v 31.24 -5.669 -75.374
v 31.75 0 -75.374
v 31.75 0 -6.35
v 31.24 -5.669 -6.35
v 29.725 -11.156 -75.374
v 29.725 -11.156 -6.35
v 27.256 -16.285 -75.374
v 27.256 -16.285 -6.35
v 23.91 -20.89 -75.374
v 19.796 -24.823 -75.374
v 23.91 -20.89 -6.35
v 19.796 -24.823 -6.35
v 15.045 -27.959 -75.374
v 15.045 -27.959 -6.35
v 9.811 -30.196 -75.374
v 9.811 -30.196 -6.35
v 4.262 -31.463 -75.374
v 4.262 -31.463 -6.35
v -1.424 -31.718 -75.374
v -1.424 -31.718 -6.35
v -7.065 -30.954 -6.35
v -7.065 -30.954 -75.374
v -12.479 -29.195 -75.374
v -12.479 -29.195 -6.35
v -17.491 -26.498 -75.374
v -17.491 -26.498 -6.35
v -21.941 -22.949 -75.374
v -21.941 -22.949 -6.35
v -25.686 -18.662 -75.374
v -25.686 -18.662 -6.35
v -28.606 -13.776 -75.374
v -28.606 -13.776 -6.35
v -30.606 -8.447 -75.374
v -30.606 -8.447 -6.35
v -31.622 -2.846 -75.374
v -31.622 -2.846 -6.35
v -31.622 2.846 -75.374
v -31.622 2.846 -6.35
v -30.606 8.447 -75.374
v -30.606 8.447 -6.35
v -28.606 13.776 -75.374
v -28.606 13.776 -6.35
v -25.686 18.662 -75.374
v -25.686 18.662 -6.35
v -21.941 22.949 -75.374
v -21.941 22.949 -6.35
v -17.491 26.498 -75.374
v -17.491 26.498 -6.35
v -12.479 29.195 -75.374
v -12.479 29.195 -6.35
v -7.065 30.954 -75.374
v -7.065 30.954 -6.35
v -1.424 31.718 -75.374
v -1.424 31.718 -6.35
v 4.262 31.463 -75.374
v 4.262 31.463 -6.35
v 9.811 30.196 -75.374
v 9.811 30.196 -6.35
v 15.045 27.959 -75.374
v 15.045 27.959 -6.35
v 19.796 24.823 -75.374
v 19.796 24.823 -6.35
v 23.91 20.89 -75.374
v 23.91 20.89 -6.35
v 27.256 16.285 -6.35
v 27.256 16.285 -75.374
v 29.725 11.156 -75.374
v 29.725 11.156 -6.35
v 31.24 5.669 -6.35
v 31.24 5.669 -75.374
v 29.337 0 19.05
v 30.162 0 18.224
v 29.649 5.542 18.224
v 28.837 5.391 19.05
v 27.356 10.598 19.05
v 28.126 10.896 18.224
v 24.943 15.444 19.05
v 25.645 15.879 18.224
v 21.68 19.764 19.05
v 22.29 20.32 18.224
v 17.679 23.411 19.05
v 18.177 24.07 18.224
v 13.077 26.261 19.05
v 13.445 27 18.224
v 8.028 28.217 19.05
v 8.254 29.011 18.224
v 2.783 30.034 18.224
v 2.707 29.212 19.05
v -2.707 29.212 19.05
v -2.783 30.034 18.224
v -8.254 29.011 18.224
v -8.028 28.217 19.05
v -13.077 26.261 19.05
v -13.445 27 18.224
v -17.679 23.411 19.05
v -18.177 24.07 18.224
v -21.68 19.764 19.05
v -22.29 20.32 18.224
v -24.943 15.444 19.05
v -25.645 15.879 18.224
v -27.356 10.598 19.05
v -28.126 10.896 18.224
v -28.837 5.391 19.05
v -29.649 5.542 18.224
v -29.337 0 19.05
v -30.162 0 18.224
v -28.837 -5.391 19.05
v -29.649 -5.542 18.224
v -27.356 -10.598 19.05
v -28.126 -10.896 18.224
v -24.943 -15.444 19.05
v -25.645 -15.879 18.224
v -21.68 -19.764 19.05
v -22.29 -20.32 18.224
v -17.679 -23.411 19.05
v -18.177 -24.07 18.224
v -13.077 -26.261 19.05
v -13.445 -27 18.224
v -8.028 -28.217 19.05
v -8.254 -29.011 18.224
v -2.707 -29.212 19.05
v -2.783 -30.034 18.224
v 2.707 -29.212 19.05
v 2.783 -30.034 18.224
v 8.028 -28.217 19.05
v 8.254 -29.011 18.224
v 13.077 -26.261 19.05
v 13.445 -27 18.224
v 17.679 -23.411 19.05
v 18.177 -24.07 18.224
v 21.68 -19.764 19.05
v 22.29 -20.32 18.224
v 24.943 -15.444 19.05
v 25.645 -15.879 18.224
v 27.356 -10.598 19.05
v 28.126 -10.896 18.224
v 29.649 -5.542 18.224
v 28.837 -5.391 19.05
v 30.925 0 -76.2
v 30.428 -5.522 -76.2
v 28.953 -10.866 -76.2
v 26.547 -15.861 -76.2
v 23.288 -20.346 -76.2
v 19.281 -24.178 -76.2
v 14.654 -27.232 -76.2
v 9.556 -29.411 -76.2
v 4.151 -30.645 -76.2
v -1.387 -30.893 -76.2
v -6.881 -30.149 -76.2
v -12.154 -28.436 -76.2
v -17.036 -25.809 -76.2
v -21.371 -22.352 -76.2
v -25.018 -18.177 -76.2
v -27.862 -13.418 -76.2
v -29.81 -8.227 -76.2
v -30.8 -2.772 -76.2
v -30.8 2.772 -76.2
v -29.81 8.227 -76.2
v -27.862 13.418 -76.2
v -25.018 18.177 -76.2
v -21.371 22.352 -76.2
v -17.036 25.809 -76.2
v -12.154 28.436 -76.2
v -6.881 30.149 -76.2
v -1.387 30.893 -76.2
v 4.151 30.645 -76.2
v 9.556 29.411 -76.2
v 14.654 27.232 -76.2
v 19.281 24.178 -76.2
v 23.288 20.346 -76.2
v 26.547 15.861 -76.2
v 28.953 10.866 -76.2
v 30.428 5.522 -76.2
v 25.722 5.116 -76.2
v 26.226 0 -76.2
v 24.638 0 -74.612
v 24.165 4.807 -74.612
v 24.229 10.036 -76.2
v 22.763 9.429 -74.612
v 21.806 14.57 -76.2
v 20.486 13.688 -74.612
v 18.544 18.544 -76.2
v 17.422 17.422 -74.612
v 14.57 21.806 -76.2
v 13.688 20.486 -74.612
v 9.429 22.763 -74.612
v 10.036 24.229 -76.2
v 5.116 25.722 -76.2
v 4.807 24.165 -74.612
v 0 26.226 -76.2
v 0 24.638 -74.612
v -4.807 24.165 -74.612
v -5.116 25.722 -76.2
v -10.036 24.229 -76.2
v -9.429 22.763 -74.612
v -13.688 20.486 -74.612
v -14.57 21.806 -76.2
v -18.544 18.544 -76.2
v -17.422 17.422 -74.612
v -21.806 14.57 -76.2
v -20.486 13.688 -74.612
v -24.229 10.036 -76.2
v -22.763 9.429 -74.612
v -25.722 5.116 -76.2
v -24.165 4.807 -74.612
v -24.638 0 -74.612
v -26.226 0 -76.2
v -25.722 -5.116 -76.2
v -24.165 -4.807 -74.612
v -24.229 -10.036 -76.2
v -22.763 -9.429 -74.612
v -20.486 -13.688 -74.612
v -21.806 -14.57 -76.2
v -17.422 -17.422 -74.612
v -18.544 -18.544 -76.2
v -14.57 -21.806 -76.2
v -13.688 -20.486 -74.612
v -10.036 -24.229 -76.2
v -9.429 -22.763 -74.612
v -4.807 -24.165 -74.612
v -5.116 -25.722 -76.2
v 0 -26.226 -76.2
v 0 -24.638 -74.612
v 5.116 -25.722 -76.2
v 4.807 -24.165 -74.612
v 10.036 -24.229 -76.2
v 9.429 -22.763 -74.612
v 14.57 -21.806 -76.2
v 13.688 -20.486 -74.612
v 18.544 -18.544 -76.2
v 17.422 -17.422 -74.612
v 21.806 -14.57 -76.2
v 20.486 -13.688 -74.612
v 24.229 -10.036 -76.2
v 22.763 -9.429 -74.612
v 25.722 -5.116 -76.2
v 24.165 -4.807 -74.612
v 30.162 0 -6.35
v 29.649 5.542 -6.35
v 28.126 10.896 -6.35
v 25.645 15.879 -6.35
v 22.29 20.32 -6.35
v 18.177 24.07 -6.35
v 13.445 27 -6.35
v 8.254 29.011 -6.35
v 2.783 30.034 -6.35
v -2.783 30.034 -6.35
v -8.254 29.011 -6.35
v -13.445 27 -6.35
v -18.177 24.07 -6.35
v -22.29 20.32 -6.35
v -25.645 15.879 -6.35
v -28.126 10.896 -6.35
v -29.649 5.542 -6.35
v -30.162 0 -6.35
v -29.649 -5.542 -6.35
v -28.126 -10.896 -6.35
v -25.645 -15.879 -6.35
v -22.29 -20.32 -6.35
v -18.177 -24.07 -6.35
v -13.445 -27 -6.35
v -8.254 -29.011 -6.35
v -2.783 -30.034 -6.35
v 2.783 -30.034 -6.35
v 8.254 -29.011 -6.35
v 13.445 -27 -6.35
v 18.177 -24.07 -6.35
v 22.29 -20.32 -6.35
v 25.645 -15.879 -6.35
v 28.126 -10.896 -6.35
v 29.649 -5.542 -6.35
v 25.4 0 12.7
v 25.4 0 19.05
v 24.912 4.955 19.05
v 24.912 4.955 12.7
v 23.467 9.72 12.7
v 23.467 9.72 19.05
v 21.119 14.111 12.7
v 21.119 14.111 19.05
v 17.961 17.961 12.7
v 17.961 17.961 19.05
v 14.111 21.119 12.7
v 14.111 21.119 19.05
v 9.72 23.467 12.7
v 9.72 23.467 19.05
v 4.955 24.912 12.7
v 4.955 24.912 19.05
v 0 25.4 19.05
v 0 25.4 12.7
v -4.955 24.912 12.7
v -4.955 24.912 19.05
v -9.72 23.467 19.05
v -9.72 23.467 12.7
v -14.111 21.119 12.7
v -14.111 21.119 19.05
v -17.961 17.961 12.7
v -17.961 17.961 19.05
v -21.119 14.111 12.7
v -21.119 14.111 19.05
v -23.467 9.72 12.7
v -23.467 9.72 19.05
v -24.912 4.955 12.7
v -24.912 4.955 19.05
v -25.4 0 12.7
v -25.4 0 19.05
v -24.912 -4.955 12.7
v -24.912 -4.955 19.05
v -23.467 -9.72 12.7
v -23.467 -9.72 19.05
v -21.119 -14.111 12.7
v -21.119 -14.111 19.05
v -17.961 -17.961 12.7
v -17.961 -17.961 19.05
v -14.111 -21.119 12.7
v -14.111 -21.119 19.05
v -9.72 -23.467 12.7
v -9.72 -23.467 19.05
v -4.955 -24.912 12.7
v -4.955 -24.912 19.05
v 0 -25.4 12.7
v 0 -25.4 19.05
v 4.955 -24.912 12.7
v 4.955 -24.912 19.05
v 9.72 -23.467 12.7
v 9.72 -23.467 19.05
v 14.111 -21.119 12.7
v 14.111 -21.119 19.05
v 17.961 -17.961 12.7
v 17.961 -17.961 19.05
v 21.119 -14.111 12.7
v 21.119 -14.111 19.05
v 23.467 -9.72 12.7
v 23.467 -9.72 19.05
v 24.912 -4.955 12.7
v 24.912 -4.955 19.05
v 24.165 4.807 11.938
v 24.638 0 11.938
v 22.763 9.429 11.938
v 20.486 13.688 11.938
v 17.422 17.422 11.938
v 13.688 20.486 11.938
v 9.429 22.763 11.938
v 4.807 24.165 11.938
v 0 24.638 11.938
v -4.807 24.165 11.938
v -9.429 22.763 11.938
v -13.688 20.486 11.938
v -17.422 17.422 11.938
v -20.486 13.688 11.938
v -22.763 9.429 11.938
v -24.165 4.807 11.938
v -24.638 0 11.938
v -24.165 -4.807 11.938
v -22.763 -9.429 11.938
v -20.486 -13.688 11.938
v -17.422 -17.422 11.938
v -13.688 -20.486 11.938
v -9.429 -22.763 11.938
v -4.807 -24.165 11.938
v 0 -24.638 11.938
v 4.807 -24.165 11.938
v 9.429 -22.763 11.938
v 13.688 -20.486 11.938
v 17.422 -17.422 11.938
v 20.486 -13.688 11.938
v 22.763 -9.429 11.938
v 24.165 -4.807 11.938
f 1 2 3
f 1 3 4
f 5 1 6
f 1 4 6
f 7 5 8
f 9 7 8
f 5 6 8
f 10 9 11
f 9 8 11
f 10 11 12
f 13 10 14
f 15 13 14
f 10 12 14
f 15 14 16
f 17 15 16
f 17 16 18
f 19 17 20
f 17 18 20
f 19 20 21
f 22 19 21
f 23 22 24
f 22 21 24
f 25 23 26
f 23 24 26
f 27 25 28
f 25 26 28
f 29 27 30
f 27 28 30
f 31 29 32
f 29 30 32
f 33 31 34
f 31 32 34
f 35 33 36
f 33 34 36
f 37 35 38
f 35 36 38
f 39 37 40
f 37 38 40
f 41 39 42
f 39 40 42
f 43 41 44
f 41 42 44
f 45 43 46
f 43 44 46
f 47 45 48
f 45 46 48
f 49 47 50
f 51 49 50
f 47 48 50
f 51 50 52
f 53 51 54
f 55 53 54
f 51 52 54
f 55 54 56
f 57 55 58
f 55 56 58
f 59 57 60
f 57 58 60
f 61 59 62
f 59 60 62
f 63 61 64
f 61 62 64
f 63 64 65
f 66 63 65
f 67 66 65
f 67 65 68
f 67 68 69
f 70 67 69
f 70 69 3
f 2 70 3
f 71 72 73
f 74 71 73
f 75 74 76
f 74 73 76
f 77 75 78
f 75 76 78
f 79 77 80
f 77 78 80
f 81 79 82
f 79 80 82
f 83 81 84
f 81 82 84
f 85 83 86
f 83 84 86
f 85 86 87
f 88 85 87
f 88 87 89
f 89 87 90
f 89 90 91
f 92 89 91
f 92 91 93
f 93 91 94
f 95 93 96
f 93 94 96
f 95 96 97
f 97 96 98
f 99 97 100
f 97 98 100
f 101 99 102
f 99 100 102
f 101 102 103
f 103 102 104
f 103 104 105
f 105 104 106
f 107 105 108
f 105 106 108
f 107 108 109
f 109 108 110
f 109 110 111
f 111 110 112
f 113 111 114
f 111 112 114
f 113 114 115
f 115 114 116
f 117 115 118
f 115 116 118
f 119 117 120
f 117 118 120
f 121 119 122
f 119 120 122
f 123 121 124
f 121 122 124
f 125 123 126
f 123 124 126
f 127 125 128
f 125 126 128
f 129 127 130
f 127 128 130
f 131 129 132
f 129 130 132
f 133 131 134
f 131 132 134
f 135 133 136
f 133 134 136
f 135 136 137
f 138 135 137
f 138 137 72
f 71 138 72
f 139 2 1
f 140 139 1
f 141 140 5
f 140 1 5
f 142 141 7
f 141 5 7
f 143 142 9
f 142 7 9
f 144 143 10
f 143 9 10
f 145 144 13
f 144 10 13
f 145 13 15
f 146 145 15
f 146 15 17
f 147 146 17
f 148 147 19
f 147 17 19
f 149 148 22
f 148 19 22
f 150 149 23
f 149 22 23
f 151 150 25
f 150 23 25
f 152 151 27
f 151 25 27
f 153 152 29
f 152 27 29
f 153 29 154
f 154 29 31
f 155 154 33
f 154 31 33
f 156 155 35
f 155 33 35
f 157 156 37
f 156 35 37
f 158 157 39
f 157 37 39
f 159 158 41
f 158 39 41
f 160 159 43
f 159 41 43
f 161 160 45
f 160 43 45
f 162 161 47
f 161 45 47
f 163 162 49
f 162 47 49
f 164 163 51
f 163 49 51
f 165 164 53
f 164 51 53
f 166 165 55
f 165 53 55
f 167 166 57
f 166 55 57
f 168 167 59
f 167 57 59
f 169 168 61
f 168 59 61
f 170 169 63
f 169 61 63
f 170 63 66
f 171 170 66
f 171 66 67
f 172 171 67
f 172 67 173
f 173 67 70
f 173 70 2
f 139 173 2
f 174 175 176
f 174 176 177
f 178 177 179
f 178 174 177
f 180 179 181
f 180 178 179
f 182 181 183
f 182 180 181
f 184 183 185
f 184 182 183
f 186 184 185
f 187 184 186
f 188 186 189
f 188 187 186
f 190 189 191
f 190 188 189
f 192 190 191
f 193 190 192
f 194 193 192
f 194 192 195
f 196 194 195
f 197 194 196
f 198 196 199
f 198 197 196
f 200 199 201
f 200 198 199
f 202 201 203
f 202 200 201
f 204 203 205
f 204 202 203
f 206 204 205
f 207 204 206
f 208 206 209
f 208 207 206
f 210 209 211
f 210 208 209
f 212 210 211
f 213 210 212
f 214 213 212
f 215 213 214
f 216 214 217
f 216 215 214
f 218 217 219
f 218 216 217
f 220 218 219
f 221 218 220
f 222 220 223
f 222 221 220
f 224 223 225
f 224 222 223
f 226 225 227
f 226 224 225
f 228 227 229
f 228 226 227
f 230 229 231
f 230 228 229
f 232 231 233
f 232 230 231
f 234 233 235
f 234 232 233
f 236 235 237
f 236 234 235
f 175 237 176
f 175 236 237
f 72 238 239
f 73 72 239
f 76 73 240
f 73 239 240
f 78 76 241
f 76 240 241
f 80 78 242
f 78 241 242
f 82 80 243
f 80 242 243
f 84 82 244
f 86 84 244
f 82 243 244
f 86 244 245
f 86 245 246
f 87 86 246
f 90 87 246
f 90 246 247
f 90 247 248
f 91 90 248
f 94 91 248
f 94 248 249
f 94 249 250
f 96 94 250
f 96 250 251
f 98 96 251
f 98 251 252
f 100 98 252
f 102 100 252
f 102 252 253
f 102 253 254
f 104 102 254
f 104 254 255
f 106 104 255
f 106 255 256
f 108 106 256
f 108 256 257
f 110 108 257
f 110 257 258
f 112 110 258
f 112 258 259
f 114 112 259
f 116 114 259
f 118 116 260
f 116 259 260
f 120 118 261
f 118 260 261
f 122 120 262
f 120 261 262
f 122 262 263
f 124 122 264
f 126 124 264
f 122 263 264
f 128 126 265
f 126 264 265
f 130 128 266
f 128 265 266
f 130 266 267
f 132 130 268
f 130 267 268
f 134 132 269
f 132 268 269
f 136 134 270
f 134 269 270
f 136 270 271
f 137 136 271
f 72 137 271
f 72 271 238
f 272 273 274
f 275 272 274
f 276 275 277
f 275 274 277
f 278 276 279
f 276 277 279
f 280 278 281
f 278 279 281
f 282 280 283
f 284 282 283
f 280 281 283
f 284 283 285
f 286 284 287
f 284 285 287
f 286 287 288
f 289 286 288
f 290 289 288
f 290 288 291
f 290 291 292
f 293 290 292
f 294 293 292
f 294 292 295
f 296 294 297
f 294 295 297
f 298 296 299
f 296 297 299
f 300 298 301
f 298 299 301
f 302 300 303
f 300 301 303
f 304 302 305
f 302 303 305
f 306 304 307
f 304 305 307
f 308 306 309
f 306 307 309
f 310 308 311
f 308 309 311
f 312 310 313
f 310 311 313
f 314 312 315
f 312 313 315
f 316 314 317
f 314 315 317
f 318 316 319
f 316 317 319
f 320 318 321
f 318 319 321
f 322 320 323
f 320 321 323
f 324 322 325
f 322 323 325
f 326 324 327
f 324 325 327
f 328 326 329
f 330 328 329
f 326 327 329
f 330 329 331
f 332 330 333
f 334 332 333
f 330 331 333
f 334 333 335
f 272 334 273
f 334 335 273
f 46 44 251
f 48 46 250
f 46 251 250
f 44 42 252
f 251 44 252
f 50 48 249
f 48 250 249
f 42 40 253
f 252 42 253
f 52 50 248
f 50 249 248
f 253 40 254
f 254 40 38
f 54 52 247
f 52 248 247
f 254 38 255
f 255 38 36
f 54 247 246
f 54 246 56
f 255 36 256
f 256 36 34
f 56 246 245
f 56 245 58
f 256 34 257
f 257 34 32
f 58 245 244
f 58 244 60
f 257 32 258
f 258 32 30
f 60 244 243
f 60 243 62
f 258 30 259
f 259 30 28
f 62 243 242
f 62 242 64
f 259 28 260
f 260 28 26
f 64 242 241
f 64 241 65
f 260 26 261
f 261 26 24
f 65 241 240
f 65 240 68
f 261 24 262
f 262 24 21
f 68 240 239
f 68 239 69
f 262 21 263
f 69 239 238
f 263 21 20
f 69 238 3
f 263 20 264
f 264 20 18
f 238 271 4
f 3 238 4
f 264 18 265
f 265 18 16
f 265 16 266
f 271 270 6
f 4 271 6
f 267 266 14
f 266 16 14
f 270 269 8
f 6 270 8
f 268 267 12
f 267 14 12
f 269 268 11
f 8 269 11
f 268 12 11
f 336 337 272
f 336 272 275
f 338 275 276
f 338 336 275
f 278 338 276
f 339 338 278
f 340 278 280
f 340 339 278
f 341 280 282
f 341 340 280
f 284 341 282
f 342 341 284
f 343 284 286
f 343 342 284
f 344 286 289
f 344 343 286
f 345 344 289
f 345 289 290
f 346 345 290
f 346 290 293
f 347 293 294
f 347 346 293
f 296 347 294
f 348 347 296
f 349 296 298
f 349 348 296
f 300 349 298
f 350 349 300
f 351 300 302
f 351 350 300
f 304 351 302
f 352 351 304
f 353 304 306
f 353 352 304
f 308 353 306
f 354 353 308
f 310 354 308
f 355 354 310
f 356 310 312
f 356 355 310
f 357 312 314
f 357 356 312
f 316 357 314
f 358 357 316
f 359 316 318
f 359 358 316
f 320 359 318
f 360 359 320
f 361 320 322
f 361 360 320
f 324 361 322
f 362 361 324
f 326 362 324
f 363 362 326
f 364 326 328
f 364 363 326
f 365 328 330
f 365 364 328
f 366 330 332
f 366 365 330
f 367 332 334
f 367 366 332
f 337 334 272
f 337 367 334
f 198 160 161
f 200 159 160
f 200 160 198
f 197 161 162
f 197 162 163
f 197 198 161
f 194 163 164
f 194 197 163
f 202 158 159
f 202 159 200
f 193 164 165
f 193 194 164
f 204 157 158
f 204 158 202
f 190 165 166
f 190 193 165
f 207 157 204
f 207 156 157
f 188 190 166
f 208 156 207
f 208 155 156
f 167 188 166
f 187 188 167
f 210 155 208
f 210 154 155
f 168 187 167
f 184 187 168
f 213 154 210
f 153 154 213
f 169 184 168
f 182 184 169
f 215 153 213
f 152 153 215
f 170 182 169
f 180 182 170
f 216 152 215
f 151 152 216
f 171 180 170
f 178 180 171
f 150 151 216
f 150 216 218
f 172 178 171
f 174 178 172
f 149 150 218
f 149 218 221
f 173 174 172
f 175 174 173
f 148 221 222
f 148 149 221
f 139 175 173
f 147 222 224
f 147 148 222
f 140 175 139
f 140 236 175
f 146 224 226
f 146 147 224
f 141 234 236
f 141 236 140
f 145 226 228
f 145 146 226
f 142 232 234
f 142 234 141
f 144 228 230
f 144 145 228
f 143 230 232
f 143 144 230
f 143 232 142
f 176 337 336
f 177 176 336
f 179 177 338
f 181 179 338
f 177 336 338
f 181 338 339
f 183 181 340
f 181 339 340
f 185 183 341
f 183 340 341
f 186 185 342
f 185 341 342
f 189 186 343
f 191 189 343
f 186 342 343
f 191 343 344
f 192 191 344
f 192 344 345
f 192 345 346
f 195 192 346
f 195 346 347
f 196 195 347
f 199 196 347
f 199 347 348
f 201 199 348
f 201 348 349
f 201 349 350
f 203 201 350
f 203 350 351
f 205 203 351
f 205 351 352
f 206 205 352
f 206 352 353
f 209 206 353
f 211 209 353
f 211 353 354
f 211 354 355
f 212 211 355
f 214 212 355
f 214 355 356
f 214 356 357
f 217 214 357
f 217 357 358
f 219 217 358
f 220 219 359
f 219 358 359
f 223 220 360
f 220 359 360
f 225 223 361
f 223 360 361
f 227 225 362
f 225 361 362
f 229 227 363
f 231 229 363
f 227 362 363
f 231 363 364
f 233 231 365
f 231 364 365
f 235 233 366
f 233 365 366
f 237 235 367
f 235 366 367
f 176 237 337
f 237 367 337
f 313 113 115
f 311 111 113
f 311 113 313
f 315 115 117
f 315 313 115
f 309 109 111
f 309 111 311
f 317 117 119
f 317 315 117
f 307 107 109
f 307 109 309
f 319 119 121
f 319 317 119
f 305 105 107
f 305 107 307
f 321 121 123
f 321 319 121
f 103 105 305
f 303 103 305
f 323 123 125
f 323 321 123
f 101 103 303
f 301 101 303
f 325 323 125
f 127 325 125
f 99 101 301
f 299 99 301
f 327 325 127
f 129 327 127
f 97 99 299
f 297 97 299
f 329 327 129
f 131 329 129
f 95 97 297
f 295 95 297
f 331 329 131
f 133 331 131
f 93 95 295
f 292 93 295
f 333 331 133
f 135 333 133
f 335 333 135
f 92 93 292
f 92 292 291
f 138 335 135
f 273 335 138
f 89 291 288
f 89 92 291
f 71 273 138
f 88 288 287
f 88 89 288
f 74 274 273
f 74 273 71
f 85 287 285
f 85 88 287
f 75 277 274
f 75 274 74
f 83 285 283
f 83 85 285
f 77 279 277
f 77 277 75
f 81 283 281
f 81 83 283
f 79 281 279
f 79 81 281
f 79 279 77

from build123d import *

# Parameters (mm, degrees)
F0_R     = 30.1625
F1_DEPTH = 6.35
F2_R     = 31.75
F3_DEPTH = 69.85
F4_R     = 30.1625
F5_DEPTH = 12.7
F6_R     = 24.638
F7_DEPTH = 95.251
F8_R     = 25.4
F9_DEPTH = 6.35
F10_SIZE = 0.76199
F11_SIZE = 1.5875
F12_SIZE = 0.8255


# Not quite as in the source:
# - a fillet or chamfer is up to 0.001 mm smaller than in the source, because OpenCascade refuses the exact size


with BuildPart() as f1:
    # F0 (on Top) → F1 (new body, symmetric)
    with BuildSketch(Plane.XY):
        Circle(F0_R)
    extrude(amount=F1_DEPTH, both=True)

    # F2 (on face) → F3 (join)
    with BuildSketch(Plane(origin=(0, 0, -6.35), x_dir=(1, 0, 0), z_dir=(0, 0, -1))):
        Circle(F2_R)
    extrude(amount=F3_DEPTH)

    # F4 (on face) → F5 (join)
    with BuildSketch(Plane.XY.offset(6.35)):
        Circle(F4_R)
    extrude(amount=F5_DEPTH)

    # F6 (on face) → F7 (cut, through all)
    with BuildSketch(Plane.XY.offset(19.05)):
        Circle(F6_R)
    extrude(amount=-F7_DEPTH, mode=Mode.SUBTRACT)

    # F8 (on face) → F9 (cut)
    with BuildSketch(Plane.XY.offset(19.05)):
        Circle(F8_R)
    extrude(amount=-F9_DEPTH, mode=Mode.SUBTRACT)

    # F10 (size 0.762 in the source; OpenCascade refuses exactly that, so slightly less here)
    f10_edges = [f1.edges().sort_by_distance(p)[0] for p in [
        (-24.638, 0, 12.7),
    ]]
    chamfer(f10_edges, length=F10_SIZE)

    # F11
    f11_edges = [f1.edges().sort_by_distance(p)[0] for p in [
        (-24.638, 0, -76.2),
    ]]
    chamfer(f11_edges, length=F11_SIZE)

    # F12
    f12_edges = [f1.edges().sort_by_distance(p)[0] for p in [
        (-31.75, 0, -76.2),
        (-30.1625, 0, 19.05),
    ]]
    chamfer(f12_edges, length=F12_SIZE)


solid = f1.part
